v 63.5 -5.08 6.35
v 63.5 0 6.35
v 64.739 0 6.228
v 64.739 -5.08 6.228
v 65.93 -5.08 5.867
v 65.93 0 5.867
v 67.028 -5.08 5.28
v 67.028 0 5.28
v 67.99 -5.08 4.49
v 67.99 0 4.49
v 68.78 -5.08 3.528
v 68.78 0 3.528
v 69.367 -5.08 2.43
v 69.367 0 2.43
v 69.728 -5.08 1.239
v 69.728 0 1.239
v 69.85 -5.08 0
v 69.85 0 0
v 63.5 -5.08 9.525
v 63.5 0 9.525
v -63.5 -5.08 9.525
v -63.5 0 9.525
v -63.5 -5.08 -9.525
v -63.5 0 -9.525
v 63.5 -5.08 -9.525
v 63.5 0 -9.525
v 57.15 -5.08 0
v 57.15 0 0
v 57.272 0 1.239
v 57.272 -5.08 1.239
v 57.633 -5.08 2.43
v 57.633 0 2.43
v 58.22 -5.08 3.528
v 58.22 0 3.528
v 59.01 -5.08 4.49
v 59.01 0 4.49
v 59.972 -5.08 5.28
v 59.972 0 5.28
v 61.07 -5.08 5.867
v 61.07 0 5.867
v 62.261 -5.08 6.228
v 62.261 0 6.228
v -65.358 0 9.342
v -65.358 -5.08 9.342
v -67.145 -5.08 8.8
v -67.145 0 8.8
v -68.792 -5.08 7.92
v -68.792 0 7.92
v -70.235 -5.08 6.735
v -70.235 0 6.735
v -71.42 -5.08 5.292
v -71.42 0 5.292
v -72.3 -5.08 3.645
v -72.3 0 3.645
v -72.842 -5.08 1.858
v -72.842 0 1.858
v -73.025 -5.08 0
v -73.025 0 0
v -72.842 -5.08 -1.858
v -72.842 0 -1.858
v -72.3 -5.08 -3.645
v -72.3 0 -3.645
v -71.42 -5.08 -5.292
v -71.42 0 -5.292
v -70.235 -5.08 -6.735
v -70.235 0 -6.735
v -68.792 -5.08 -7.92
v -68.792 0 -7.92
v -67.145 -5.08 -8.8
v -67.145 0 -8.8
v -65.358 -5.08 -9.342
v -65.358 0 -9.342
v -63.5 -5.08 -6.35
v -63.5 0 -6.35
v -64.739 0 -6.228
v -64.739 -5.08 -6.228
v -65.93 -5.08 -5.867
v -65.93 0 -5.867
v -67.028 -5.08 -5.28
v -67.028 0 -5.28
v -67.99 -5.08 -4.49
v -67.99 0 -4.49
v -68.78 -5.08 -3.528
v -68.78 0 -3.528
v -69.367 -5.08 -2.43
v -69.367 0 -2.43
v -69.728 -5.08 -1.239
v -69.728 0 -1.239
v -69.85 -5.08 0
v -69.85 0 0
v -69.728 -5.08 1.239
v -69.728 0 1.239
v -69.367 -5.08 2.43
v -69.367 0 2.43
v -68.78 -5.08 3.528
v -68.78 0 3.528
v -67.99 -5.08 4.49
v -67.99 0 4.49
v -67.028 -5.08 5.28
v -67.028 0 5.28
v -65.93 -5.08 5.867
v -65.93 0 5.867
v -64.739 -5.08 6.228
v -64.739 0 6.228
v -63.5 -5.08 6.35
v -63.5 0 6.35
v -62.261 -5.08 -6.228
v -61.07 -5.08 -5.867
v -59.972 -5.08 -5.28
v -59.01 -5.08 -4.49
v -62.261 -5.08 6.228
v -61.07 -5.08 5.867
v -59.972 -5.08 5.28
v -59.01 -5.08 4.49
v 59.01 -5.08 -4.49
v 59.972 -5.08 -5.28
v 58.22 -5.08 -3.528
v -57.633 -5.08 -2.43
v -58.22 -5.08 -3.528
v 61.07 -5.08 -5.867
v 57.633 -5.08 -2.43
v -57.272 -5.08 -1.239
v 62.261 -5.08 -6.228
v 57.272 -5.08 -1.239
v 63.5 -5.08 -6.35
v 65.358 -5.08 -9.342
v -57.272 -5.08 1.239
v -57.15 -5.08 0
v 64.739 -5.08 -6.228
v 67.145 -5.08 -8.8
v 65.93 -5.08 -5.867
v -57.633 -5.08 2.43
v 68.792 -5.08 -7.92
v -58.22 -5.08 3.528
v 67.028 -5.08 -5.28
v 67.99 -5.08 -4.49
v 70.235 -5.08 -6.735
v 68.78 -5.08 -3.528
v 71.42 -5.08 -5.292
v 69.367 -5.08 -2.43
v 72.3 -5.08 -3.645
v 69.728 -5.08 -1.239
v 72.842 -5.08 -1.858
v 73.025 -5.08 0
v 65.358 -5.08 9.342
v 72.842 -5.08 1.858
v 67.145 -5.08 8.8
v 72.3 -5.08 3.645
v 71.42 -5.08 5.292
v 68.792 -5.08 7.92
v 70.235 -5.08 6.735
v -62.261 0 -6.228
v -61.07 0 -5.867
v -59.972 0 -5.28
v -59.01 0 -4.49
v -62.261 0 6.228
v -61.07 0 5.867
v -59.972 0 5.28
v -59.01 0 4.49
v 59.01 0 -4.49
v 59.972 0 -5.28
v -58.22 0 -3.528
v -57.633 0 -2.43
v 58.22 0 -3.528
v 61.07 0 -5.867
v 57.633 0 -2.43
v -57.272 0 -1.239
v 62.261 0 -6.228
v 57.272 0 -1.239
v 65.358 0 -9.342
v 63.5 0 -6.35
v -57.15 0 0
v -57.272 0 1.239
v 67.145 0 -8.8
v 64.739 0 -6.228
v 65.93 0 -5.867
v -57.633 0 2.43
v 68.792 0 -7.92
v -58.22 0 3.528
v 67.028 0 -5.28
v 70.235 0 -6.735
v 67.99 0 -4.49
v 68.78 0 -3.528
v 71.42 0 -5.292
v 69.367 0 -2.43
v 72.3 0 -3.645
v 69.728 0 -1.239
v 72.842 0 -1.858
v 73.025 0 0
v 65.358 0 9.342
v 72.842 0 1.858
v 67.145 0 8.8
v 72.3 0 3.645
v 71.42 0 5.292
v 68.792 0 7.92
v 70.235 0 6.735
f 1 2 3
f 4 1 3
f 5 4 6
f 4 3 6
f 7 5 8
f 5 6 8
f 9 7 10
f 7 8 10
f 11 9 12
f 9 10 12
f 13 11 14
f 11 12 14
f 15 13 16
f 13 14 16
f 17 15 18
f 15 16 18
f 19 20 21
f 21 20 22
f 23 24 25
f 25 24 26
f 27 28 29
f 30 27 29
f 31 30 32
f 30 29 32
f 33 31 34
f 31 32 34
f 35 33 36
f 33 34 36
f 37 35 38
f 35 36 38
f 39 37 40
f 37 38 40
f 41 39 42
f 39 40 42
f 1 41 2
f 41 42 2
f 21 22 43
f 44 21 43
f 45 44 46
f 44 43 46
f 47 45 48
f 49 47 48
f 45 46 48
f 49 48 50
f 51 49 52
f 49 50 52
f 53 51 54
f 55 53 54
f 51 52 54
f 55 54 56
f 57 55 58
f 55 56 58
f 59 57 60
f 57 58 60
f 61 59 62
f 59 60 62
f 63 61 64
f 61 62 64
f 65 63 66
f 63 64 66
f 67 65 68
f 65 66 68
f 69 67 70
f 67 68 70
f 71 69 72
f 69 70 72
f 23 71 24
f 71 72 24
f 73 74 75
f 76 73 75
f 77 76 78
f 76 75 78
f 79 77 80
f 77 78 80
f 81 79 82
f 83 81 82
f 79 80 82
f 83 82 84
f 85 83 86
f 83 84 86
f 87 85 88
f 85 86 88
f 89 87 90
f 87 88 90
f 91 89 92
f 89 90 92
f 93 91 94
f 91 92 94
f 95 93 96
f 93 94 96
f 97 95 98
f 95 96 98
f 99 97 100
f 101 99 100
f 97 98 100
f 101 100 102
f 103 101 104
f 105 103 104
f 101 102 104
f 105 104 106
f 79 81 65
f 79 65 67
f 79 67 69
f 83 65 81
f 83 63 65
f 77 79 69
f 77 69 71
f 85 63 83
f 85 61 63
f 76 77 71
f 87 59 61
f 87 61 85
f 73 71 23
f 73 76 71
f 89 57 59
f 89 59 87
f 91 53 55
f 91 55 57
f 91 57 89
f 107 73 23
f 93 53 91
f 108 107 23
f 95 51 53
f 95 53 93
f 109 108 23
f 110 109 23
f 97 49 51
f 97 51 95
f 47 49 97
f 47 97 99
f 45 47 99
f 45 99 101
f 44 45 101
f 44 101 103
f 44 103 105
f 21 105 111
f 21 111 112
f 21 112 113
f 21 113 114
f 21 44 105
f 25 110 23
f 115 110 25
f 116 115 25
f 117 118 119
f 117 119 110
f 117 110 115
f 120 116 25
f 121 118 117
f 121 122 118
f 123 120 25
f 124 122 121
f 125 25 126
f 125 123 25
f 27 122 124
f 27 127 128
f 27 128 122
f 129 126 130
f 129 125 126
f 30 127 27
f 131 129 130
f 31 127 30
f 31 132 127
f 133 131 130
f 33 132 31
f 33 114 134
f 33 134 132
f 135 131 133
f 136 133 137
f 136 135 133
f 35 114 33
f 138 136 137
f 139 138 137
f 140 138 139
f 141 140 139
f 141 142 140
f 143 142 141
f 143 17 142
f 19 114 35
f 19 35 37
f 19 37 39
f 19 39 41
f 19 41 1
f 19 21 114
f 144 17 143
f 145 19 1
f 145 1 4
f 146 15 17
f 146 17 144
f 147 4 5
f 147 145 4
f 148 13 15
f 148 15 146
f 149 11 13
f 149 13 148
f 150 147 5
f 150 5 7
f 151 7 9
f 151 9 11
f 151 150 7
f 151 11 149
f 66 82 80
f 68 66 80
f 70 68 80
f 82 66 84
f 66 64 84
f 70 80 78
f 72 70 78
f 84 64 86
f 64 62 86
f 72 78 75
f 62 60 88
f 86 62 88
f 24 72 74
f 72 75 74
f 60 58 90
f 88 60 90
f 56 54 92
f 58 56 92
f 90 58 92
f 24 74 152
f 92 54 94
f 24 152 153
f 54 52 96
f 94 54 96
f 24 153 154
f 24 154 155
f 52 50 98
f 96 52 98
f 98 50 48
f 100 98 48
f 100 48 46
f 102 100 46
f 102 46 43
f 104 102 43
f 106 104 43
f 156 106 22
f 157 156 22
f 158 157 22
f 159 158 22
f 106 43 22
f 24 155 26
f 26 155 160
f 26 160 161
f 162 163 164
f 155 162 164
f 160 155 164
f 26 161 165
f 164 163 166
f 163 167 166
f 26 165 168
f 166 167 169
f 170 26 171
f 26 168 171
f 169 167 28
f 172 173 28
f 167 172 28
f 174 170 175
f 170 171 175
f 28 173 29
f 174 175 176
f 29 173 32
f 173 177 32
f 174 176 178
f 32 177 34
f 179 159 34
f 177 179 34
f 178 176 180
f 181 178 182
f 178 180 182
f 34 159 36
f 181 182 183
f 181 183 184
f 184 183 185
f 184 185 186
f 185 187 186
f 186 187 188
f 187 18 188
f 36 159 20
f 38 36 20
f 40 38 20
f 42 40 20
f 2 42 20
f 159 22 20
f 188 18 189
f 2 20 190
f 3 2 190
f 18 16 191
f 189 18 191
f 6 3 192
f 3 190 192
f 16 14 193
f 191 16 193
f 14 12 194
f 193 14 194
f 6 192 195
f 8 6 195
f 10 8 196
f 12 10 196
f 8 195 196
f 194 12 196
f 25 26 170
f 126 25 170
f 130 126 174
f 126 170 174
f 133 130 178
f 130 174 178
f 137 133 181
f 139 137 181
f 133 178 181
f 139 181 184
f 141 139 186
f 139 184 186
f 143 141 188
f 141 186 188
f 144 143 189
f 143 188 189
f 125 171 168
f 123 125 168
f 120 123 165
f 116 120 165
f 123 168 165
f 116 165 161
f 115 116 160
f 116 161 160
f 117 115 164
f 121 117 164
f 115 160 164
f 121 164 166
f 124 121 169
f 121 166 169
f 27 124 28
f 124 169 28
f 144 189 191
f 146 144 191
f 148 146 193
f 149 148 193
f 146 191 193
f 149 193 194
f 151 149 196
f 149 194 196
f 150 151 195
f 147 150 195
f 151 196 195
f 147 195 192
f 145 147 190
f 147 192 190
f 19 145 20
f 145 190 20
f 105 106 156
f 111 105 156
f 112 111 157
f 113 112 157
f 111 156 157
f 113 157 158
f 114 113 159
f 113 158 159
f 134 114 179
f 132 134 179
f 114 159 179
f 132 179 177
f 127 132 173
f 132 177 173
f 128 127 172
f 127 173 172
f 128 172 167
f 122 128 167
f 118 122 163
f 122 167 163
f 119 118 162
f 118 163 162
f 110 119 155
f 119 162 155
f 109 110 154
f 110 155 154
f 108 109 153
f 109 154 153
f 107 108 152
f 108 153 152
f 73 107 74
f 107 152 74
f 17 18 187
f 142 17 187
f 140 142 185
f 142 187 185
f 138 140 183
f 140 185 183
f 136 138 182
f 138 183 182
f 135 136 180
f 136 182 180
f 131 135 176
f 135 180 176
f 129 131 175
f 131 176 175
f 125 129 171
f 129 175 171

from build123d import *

# Parameters (mm, degrees)
F1_DEPTH = 5.08


with BuildPart() as f1:
    # F0 (on Front) → F1 (new body)
    with BuildSketch(Plane.XZ):
        with BuildLine():
            Line((53.975, 0), (0, 0))
            Line((0, 0), (-53.975, 0))
            ThreePointArc((-53.975, 0), (-56.7648079092, -6.7351920908), (-63.5, -9.525))
            Line((-63.5, -9.525), (63.5, -9.525))
            ThreePointArc((63.5, -9.525), (56.7648079092, -6.7351920908), (53.975, 0))
        make_face()
        with BuildLine():
            Line((-53.975, 0), (0, 0))
            Line((0, 0), (53.975, 0))
            ThreePointArc((53.975, 0), (56.7648079092, 6.7351920908), (63.5, 9.525))
            Line((63.5, 9.525), (-63.5, 9.525))
            ThreePointArc((-63.5, 9.525), (-56.7648079092, 6.7351920908), (-53.975, 0))
        make_face()
        with BuildLine():
            ThreePointArc((-63.5, -9.525), (-56.7648079092, -6.7351920908), (-53.975, 0))
            Line((-53.975, 0), (-57.15, 0))
            ThreePointArc((-57.15, 0), (-59.0098719395, -4.4901280605), (-63.5, -6.35))
            Line((-63.5, -6.35), (-63.5, -9.525))
        make_face()
        with BuildLine():
            Line((-57.15, 0), (-53.975, 0))
            ThreePointArc((-53.975, 0), (-56.7648079092, 6.7351920908), (-63.5, 9.525))
            Line((-63.5, 9.525), (-63.5, 6.35))
            ThreePointArc((-63.5, 6.35), (-59.0098719395, 4.4901280605), (-57.15, 0))
        make_face()
        with BuildLine():
            ThreePointArc((63.5, 9.525), (56.7648079092, 6.7351920908), (53.975, 0))
            Line((53.975, 0), (57.15, 0))
            ThreePointArc((57.15, 0), (59.0098719395, 4.4901280605), (63.5, 6.35))
            Line((63.5, 6.35), (63.5, 9.525))
        make_face()
        with BuildLine():
            Line((57.15, 0), (53.975, 0))
            ThreePointArc((53.975, 0), (56.7648079092, -6.7351920908), (63.5, -9.525))
            Line((63.5, -9.525), (63.5, -6.35))
            ThreePointArc((63.5, -6.35), (59.0098719395, -4.4901280605), (57.15, 0))
        make_face()
        with BuildLine():
            Line((-63.5, 6.35), (-63.5, 9.525))
            ThreePointArc((-63.5, 9.525), (-73.025, 0), (-63.5, -9.525))
            Line((-63.5, -9.525), (-63.5, -6.35))
            ThreePointArc((-63.5, -6.35), (-69.85, 0), (-63.5, 6.35))
        make_face()
        with BuildLine():
            ThreePointArc((73.025, 0), (70.2351920908, 6.7351920908), (63.5, 9.525))
            Line((63.5, 9.525), (63.5, 6.35))
            ThreePointArc((63.5, 6.35), (67.9901280605, 4.4901280605), (69.85, 0))
            ThreePointArc((69.85, 0), (67.9901280605, -4.4901280605), (63.5, -6.35))
            Line((63.5, -6.35), (63.5, -9.525))
            ThreePointArc((63.5, -9.525), (70.2351920908, -6.7351920908), (73.025, 0))
        make_face()
    extrude(amount=F1_DEPTH)


solid = f1.part
